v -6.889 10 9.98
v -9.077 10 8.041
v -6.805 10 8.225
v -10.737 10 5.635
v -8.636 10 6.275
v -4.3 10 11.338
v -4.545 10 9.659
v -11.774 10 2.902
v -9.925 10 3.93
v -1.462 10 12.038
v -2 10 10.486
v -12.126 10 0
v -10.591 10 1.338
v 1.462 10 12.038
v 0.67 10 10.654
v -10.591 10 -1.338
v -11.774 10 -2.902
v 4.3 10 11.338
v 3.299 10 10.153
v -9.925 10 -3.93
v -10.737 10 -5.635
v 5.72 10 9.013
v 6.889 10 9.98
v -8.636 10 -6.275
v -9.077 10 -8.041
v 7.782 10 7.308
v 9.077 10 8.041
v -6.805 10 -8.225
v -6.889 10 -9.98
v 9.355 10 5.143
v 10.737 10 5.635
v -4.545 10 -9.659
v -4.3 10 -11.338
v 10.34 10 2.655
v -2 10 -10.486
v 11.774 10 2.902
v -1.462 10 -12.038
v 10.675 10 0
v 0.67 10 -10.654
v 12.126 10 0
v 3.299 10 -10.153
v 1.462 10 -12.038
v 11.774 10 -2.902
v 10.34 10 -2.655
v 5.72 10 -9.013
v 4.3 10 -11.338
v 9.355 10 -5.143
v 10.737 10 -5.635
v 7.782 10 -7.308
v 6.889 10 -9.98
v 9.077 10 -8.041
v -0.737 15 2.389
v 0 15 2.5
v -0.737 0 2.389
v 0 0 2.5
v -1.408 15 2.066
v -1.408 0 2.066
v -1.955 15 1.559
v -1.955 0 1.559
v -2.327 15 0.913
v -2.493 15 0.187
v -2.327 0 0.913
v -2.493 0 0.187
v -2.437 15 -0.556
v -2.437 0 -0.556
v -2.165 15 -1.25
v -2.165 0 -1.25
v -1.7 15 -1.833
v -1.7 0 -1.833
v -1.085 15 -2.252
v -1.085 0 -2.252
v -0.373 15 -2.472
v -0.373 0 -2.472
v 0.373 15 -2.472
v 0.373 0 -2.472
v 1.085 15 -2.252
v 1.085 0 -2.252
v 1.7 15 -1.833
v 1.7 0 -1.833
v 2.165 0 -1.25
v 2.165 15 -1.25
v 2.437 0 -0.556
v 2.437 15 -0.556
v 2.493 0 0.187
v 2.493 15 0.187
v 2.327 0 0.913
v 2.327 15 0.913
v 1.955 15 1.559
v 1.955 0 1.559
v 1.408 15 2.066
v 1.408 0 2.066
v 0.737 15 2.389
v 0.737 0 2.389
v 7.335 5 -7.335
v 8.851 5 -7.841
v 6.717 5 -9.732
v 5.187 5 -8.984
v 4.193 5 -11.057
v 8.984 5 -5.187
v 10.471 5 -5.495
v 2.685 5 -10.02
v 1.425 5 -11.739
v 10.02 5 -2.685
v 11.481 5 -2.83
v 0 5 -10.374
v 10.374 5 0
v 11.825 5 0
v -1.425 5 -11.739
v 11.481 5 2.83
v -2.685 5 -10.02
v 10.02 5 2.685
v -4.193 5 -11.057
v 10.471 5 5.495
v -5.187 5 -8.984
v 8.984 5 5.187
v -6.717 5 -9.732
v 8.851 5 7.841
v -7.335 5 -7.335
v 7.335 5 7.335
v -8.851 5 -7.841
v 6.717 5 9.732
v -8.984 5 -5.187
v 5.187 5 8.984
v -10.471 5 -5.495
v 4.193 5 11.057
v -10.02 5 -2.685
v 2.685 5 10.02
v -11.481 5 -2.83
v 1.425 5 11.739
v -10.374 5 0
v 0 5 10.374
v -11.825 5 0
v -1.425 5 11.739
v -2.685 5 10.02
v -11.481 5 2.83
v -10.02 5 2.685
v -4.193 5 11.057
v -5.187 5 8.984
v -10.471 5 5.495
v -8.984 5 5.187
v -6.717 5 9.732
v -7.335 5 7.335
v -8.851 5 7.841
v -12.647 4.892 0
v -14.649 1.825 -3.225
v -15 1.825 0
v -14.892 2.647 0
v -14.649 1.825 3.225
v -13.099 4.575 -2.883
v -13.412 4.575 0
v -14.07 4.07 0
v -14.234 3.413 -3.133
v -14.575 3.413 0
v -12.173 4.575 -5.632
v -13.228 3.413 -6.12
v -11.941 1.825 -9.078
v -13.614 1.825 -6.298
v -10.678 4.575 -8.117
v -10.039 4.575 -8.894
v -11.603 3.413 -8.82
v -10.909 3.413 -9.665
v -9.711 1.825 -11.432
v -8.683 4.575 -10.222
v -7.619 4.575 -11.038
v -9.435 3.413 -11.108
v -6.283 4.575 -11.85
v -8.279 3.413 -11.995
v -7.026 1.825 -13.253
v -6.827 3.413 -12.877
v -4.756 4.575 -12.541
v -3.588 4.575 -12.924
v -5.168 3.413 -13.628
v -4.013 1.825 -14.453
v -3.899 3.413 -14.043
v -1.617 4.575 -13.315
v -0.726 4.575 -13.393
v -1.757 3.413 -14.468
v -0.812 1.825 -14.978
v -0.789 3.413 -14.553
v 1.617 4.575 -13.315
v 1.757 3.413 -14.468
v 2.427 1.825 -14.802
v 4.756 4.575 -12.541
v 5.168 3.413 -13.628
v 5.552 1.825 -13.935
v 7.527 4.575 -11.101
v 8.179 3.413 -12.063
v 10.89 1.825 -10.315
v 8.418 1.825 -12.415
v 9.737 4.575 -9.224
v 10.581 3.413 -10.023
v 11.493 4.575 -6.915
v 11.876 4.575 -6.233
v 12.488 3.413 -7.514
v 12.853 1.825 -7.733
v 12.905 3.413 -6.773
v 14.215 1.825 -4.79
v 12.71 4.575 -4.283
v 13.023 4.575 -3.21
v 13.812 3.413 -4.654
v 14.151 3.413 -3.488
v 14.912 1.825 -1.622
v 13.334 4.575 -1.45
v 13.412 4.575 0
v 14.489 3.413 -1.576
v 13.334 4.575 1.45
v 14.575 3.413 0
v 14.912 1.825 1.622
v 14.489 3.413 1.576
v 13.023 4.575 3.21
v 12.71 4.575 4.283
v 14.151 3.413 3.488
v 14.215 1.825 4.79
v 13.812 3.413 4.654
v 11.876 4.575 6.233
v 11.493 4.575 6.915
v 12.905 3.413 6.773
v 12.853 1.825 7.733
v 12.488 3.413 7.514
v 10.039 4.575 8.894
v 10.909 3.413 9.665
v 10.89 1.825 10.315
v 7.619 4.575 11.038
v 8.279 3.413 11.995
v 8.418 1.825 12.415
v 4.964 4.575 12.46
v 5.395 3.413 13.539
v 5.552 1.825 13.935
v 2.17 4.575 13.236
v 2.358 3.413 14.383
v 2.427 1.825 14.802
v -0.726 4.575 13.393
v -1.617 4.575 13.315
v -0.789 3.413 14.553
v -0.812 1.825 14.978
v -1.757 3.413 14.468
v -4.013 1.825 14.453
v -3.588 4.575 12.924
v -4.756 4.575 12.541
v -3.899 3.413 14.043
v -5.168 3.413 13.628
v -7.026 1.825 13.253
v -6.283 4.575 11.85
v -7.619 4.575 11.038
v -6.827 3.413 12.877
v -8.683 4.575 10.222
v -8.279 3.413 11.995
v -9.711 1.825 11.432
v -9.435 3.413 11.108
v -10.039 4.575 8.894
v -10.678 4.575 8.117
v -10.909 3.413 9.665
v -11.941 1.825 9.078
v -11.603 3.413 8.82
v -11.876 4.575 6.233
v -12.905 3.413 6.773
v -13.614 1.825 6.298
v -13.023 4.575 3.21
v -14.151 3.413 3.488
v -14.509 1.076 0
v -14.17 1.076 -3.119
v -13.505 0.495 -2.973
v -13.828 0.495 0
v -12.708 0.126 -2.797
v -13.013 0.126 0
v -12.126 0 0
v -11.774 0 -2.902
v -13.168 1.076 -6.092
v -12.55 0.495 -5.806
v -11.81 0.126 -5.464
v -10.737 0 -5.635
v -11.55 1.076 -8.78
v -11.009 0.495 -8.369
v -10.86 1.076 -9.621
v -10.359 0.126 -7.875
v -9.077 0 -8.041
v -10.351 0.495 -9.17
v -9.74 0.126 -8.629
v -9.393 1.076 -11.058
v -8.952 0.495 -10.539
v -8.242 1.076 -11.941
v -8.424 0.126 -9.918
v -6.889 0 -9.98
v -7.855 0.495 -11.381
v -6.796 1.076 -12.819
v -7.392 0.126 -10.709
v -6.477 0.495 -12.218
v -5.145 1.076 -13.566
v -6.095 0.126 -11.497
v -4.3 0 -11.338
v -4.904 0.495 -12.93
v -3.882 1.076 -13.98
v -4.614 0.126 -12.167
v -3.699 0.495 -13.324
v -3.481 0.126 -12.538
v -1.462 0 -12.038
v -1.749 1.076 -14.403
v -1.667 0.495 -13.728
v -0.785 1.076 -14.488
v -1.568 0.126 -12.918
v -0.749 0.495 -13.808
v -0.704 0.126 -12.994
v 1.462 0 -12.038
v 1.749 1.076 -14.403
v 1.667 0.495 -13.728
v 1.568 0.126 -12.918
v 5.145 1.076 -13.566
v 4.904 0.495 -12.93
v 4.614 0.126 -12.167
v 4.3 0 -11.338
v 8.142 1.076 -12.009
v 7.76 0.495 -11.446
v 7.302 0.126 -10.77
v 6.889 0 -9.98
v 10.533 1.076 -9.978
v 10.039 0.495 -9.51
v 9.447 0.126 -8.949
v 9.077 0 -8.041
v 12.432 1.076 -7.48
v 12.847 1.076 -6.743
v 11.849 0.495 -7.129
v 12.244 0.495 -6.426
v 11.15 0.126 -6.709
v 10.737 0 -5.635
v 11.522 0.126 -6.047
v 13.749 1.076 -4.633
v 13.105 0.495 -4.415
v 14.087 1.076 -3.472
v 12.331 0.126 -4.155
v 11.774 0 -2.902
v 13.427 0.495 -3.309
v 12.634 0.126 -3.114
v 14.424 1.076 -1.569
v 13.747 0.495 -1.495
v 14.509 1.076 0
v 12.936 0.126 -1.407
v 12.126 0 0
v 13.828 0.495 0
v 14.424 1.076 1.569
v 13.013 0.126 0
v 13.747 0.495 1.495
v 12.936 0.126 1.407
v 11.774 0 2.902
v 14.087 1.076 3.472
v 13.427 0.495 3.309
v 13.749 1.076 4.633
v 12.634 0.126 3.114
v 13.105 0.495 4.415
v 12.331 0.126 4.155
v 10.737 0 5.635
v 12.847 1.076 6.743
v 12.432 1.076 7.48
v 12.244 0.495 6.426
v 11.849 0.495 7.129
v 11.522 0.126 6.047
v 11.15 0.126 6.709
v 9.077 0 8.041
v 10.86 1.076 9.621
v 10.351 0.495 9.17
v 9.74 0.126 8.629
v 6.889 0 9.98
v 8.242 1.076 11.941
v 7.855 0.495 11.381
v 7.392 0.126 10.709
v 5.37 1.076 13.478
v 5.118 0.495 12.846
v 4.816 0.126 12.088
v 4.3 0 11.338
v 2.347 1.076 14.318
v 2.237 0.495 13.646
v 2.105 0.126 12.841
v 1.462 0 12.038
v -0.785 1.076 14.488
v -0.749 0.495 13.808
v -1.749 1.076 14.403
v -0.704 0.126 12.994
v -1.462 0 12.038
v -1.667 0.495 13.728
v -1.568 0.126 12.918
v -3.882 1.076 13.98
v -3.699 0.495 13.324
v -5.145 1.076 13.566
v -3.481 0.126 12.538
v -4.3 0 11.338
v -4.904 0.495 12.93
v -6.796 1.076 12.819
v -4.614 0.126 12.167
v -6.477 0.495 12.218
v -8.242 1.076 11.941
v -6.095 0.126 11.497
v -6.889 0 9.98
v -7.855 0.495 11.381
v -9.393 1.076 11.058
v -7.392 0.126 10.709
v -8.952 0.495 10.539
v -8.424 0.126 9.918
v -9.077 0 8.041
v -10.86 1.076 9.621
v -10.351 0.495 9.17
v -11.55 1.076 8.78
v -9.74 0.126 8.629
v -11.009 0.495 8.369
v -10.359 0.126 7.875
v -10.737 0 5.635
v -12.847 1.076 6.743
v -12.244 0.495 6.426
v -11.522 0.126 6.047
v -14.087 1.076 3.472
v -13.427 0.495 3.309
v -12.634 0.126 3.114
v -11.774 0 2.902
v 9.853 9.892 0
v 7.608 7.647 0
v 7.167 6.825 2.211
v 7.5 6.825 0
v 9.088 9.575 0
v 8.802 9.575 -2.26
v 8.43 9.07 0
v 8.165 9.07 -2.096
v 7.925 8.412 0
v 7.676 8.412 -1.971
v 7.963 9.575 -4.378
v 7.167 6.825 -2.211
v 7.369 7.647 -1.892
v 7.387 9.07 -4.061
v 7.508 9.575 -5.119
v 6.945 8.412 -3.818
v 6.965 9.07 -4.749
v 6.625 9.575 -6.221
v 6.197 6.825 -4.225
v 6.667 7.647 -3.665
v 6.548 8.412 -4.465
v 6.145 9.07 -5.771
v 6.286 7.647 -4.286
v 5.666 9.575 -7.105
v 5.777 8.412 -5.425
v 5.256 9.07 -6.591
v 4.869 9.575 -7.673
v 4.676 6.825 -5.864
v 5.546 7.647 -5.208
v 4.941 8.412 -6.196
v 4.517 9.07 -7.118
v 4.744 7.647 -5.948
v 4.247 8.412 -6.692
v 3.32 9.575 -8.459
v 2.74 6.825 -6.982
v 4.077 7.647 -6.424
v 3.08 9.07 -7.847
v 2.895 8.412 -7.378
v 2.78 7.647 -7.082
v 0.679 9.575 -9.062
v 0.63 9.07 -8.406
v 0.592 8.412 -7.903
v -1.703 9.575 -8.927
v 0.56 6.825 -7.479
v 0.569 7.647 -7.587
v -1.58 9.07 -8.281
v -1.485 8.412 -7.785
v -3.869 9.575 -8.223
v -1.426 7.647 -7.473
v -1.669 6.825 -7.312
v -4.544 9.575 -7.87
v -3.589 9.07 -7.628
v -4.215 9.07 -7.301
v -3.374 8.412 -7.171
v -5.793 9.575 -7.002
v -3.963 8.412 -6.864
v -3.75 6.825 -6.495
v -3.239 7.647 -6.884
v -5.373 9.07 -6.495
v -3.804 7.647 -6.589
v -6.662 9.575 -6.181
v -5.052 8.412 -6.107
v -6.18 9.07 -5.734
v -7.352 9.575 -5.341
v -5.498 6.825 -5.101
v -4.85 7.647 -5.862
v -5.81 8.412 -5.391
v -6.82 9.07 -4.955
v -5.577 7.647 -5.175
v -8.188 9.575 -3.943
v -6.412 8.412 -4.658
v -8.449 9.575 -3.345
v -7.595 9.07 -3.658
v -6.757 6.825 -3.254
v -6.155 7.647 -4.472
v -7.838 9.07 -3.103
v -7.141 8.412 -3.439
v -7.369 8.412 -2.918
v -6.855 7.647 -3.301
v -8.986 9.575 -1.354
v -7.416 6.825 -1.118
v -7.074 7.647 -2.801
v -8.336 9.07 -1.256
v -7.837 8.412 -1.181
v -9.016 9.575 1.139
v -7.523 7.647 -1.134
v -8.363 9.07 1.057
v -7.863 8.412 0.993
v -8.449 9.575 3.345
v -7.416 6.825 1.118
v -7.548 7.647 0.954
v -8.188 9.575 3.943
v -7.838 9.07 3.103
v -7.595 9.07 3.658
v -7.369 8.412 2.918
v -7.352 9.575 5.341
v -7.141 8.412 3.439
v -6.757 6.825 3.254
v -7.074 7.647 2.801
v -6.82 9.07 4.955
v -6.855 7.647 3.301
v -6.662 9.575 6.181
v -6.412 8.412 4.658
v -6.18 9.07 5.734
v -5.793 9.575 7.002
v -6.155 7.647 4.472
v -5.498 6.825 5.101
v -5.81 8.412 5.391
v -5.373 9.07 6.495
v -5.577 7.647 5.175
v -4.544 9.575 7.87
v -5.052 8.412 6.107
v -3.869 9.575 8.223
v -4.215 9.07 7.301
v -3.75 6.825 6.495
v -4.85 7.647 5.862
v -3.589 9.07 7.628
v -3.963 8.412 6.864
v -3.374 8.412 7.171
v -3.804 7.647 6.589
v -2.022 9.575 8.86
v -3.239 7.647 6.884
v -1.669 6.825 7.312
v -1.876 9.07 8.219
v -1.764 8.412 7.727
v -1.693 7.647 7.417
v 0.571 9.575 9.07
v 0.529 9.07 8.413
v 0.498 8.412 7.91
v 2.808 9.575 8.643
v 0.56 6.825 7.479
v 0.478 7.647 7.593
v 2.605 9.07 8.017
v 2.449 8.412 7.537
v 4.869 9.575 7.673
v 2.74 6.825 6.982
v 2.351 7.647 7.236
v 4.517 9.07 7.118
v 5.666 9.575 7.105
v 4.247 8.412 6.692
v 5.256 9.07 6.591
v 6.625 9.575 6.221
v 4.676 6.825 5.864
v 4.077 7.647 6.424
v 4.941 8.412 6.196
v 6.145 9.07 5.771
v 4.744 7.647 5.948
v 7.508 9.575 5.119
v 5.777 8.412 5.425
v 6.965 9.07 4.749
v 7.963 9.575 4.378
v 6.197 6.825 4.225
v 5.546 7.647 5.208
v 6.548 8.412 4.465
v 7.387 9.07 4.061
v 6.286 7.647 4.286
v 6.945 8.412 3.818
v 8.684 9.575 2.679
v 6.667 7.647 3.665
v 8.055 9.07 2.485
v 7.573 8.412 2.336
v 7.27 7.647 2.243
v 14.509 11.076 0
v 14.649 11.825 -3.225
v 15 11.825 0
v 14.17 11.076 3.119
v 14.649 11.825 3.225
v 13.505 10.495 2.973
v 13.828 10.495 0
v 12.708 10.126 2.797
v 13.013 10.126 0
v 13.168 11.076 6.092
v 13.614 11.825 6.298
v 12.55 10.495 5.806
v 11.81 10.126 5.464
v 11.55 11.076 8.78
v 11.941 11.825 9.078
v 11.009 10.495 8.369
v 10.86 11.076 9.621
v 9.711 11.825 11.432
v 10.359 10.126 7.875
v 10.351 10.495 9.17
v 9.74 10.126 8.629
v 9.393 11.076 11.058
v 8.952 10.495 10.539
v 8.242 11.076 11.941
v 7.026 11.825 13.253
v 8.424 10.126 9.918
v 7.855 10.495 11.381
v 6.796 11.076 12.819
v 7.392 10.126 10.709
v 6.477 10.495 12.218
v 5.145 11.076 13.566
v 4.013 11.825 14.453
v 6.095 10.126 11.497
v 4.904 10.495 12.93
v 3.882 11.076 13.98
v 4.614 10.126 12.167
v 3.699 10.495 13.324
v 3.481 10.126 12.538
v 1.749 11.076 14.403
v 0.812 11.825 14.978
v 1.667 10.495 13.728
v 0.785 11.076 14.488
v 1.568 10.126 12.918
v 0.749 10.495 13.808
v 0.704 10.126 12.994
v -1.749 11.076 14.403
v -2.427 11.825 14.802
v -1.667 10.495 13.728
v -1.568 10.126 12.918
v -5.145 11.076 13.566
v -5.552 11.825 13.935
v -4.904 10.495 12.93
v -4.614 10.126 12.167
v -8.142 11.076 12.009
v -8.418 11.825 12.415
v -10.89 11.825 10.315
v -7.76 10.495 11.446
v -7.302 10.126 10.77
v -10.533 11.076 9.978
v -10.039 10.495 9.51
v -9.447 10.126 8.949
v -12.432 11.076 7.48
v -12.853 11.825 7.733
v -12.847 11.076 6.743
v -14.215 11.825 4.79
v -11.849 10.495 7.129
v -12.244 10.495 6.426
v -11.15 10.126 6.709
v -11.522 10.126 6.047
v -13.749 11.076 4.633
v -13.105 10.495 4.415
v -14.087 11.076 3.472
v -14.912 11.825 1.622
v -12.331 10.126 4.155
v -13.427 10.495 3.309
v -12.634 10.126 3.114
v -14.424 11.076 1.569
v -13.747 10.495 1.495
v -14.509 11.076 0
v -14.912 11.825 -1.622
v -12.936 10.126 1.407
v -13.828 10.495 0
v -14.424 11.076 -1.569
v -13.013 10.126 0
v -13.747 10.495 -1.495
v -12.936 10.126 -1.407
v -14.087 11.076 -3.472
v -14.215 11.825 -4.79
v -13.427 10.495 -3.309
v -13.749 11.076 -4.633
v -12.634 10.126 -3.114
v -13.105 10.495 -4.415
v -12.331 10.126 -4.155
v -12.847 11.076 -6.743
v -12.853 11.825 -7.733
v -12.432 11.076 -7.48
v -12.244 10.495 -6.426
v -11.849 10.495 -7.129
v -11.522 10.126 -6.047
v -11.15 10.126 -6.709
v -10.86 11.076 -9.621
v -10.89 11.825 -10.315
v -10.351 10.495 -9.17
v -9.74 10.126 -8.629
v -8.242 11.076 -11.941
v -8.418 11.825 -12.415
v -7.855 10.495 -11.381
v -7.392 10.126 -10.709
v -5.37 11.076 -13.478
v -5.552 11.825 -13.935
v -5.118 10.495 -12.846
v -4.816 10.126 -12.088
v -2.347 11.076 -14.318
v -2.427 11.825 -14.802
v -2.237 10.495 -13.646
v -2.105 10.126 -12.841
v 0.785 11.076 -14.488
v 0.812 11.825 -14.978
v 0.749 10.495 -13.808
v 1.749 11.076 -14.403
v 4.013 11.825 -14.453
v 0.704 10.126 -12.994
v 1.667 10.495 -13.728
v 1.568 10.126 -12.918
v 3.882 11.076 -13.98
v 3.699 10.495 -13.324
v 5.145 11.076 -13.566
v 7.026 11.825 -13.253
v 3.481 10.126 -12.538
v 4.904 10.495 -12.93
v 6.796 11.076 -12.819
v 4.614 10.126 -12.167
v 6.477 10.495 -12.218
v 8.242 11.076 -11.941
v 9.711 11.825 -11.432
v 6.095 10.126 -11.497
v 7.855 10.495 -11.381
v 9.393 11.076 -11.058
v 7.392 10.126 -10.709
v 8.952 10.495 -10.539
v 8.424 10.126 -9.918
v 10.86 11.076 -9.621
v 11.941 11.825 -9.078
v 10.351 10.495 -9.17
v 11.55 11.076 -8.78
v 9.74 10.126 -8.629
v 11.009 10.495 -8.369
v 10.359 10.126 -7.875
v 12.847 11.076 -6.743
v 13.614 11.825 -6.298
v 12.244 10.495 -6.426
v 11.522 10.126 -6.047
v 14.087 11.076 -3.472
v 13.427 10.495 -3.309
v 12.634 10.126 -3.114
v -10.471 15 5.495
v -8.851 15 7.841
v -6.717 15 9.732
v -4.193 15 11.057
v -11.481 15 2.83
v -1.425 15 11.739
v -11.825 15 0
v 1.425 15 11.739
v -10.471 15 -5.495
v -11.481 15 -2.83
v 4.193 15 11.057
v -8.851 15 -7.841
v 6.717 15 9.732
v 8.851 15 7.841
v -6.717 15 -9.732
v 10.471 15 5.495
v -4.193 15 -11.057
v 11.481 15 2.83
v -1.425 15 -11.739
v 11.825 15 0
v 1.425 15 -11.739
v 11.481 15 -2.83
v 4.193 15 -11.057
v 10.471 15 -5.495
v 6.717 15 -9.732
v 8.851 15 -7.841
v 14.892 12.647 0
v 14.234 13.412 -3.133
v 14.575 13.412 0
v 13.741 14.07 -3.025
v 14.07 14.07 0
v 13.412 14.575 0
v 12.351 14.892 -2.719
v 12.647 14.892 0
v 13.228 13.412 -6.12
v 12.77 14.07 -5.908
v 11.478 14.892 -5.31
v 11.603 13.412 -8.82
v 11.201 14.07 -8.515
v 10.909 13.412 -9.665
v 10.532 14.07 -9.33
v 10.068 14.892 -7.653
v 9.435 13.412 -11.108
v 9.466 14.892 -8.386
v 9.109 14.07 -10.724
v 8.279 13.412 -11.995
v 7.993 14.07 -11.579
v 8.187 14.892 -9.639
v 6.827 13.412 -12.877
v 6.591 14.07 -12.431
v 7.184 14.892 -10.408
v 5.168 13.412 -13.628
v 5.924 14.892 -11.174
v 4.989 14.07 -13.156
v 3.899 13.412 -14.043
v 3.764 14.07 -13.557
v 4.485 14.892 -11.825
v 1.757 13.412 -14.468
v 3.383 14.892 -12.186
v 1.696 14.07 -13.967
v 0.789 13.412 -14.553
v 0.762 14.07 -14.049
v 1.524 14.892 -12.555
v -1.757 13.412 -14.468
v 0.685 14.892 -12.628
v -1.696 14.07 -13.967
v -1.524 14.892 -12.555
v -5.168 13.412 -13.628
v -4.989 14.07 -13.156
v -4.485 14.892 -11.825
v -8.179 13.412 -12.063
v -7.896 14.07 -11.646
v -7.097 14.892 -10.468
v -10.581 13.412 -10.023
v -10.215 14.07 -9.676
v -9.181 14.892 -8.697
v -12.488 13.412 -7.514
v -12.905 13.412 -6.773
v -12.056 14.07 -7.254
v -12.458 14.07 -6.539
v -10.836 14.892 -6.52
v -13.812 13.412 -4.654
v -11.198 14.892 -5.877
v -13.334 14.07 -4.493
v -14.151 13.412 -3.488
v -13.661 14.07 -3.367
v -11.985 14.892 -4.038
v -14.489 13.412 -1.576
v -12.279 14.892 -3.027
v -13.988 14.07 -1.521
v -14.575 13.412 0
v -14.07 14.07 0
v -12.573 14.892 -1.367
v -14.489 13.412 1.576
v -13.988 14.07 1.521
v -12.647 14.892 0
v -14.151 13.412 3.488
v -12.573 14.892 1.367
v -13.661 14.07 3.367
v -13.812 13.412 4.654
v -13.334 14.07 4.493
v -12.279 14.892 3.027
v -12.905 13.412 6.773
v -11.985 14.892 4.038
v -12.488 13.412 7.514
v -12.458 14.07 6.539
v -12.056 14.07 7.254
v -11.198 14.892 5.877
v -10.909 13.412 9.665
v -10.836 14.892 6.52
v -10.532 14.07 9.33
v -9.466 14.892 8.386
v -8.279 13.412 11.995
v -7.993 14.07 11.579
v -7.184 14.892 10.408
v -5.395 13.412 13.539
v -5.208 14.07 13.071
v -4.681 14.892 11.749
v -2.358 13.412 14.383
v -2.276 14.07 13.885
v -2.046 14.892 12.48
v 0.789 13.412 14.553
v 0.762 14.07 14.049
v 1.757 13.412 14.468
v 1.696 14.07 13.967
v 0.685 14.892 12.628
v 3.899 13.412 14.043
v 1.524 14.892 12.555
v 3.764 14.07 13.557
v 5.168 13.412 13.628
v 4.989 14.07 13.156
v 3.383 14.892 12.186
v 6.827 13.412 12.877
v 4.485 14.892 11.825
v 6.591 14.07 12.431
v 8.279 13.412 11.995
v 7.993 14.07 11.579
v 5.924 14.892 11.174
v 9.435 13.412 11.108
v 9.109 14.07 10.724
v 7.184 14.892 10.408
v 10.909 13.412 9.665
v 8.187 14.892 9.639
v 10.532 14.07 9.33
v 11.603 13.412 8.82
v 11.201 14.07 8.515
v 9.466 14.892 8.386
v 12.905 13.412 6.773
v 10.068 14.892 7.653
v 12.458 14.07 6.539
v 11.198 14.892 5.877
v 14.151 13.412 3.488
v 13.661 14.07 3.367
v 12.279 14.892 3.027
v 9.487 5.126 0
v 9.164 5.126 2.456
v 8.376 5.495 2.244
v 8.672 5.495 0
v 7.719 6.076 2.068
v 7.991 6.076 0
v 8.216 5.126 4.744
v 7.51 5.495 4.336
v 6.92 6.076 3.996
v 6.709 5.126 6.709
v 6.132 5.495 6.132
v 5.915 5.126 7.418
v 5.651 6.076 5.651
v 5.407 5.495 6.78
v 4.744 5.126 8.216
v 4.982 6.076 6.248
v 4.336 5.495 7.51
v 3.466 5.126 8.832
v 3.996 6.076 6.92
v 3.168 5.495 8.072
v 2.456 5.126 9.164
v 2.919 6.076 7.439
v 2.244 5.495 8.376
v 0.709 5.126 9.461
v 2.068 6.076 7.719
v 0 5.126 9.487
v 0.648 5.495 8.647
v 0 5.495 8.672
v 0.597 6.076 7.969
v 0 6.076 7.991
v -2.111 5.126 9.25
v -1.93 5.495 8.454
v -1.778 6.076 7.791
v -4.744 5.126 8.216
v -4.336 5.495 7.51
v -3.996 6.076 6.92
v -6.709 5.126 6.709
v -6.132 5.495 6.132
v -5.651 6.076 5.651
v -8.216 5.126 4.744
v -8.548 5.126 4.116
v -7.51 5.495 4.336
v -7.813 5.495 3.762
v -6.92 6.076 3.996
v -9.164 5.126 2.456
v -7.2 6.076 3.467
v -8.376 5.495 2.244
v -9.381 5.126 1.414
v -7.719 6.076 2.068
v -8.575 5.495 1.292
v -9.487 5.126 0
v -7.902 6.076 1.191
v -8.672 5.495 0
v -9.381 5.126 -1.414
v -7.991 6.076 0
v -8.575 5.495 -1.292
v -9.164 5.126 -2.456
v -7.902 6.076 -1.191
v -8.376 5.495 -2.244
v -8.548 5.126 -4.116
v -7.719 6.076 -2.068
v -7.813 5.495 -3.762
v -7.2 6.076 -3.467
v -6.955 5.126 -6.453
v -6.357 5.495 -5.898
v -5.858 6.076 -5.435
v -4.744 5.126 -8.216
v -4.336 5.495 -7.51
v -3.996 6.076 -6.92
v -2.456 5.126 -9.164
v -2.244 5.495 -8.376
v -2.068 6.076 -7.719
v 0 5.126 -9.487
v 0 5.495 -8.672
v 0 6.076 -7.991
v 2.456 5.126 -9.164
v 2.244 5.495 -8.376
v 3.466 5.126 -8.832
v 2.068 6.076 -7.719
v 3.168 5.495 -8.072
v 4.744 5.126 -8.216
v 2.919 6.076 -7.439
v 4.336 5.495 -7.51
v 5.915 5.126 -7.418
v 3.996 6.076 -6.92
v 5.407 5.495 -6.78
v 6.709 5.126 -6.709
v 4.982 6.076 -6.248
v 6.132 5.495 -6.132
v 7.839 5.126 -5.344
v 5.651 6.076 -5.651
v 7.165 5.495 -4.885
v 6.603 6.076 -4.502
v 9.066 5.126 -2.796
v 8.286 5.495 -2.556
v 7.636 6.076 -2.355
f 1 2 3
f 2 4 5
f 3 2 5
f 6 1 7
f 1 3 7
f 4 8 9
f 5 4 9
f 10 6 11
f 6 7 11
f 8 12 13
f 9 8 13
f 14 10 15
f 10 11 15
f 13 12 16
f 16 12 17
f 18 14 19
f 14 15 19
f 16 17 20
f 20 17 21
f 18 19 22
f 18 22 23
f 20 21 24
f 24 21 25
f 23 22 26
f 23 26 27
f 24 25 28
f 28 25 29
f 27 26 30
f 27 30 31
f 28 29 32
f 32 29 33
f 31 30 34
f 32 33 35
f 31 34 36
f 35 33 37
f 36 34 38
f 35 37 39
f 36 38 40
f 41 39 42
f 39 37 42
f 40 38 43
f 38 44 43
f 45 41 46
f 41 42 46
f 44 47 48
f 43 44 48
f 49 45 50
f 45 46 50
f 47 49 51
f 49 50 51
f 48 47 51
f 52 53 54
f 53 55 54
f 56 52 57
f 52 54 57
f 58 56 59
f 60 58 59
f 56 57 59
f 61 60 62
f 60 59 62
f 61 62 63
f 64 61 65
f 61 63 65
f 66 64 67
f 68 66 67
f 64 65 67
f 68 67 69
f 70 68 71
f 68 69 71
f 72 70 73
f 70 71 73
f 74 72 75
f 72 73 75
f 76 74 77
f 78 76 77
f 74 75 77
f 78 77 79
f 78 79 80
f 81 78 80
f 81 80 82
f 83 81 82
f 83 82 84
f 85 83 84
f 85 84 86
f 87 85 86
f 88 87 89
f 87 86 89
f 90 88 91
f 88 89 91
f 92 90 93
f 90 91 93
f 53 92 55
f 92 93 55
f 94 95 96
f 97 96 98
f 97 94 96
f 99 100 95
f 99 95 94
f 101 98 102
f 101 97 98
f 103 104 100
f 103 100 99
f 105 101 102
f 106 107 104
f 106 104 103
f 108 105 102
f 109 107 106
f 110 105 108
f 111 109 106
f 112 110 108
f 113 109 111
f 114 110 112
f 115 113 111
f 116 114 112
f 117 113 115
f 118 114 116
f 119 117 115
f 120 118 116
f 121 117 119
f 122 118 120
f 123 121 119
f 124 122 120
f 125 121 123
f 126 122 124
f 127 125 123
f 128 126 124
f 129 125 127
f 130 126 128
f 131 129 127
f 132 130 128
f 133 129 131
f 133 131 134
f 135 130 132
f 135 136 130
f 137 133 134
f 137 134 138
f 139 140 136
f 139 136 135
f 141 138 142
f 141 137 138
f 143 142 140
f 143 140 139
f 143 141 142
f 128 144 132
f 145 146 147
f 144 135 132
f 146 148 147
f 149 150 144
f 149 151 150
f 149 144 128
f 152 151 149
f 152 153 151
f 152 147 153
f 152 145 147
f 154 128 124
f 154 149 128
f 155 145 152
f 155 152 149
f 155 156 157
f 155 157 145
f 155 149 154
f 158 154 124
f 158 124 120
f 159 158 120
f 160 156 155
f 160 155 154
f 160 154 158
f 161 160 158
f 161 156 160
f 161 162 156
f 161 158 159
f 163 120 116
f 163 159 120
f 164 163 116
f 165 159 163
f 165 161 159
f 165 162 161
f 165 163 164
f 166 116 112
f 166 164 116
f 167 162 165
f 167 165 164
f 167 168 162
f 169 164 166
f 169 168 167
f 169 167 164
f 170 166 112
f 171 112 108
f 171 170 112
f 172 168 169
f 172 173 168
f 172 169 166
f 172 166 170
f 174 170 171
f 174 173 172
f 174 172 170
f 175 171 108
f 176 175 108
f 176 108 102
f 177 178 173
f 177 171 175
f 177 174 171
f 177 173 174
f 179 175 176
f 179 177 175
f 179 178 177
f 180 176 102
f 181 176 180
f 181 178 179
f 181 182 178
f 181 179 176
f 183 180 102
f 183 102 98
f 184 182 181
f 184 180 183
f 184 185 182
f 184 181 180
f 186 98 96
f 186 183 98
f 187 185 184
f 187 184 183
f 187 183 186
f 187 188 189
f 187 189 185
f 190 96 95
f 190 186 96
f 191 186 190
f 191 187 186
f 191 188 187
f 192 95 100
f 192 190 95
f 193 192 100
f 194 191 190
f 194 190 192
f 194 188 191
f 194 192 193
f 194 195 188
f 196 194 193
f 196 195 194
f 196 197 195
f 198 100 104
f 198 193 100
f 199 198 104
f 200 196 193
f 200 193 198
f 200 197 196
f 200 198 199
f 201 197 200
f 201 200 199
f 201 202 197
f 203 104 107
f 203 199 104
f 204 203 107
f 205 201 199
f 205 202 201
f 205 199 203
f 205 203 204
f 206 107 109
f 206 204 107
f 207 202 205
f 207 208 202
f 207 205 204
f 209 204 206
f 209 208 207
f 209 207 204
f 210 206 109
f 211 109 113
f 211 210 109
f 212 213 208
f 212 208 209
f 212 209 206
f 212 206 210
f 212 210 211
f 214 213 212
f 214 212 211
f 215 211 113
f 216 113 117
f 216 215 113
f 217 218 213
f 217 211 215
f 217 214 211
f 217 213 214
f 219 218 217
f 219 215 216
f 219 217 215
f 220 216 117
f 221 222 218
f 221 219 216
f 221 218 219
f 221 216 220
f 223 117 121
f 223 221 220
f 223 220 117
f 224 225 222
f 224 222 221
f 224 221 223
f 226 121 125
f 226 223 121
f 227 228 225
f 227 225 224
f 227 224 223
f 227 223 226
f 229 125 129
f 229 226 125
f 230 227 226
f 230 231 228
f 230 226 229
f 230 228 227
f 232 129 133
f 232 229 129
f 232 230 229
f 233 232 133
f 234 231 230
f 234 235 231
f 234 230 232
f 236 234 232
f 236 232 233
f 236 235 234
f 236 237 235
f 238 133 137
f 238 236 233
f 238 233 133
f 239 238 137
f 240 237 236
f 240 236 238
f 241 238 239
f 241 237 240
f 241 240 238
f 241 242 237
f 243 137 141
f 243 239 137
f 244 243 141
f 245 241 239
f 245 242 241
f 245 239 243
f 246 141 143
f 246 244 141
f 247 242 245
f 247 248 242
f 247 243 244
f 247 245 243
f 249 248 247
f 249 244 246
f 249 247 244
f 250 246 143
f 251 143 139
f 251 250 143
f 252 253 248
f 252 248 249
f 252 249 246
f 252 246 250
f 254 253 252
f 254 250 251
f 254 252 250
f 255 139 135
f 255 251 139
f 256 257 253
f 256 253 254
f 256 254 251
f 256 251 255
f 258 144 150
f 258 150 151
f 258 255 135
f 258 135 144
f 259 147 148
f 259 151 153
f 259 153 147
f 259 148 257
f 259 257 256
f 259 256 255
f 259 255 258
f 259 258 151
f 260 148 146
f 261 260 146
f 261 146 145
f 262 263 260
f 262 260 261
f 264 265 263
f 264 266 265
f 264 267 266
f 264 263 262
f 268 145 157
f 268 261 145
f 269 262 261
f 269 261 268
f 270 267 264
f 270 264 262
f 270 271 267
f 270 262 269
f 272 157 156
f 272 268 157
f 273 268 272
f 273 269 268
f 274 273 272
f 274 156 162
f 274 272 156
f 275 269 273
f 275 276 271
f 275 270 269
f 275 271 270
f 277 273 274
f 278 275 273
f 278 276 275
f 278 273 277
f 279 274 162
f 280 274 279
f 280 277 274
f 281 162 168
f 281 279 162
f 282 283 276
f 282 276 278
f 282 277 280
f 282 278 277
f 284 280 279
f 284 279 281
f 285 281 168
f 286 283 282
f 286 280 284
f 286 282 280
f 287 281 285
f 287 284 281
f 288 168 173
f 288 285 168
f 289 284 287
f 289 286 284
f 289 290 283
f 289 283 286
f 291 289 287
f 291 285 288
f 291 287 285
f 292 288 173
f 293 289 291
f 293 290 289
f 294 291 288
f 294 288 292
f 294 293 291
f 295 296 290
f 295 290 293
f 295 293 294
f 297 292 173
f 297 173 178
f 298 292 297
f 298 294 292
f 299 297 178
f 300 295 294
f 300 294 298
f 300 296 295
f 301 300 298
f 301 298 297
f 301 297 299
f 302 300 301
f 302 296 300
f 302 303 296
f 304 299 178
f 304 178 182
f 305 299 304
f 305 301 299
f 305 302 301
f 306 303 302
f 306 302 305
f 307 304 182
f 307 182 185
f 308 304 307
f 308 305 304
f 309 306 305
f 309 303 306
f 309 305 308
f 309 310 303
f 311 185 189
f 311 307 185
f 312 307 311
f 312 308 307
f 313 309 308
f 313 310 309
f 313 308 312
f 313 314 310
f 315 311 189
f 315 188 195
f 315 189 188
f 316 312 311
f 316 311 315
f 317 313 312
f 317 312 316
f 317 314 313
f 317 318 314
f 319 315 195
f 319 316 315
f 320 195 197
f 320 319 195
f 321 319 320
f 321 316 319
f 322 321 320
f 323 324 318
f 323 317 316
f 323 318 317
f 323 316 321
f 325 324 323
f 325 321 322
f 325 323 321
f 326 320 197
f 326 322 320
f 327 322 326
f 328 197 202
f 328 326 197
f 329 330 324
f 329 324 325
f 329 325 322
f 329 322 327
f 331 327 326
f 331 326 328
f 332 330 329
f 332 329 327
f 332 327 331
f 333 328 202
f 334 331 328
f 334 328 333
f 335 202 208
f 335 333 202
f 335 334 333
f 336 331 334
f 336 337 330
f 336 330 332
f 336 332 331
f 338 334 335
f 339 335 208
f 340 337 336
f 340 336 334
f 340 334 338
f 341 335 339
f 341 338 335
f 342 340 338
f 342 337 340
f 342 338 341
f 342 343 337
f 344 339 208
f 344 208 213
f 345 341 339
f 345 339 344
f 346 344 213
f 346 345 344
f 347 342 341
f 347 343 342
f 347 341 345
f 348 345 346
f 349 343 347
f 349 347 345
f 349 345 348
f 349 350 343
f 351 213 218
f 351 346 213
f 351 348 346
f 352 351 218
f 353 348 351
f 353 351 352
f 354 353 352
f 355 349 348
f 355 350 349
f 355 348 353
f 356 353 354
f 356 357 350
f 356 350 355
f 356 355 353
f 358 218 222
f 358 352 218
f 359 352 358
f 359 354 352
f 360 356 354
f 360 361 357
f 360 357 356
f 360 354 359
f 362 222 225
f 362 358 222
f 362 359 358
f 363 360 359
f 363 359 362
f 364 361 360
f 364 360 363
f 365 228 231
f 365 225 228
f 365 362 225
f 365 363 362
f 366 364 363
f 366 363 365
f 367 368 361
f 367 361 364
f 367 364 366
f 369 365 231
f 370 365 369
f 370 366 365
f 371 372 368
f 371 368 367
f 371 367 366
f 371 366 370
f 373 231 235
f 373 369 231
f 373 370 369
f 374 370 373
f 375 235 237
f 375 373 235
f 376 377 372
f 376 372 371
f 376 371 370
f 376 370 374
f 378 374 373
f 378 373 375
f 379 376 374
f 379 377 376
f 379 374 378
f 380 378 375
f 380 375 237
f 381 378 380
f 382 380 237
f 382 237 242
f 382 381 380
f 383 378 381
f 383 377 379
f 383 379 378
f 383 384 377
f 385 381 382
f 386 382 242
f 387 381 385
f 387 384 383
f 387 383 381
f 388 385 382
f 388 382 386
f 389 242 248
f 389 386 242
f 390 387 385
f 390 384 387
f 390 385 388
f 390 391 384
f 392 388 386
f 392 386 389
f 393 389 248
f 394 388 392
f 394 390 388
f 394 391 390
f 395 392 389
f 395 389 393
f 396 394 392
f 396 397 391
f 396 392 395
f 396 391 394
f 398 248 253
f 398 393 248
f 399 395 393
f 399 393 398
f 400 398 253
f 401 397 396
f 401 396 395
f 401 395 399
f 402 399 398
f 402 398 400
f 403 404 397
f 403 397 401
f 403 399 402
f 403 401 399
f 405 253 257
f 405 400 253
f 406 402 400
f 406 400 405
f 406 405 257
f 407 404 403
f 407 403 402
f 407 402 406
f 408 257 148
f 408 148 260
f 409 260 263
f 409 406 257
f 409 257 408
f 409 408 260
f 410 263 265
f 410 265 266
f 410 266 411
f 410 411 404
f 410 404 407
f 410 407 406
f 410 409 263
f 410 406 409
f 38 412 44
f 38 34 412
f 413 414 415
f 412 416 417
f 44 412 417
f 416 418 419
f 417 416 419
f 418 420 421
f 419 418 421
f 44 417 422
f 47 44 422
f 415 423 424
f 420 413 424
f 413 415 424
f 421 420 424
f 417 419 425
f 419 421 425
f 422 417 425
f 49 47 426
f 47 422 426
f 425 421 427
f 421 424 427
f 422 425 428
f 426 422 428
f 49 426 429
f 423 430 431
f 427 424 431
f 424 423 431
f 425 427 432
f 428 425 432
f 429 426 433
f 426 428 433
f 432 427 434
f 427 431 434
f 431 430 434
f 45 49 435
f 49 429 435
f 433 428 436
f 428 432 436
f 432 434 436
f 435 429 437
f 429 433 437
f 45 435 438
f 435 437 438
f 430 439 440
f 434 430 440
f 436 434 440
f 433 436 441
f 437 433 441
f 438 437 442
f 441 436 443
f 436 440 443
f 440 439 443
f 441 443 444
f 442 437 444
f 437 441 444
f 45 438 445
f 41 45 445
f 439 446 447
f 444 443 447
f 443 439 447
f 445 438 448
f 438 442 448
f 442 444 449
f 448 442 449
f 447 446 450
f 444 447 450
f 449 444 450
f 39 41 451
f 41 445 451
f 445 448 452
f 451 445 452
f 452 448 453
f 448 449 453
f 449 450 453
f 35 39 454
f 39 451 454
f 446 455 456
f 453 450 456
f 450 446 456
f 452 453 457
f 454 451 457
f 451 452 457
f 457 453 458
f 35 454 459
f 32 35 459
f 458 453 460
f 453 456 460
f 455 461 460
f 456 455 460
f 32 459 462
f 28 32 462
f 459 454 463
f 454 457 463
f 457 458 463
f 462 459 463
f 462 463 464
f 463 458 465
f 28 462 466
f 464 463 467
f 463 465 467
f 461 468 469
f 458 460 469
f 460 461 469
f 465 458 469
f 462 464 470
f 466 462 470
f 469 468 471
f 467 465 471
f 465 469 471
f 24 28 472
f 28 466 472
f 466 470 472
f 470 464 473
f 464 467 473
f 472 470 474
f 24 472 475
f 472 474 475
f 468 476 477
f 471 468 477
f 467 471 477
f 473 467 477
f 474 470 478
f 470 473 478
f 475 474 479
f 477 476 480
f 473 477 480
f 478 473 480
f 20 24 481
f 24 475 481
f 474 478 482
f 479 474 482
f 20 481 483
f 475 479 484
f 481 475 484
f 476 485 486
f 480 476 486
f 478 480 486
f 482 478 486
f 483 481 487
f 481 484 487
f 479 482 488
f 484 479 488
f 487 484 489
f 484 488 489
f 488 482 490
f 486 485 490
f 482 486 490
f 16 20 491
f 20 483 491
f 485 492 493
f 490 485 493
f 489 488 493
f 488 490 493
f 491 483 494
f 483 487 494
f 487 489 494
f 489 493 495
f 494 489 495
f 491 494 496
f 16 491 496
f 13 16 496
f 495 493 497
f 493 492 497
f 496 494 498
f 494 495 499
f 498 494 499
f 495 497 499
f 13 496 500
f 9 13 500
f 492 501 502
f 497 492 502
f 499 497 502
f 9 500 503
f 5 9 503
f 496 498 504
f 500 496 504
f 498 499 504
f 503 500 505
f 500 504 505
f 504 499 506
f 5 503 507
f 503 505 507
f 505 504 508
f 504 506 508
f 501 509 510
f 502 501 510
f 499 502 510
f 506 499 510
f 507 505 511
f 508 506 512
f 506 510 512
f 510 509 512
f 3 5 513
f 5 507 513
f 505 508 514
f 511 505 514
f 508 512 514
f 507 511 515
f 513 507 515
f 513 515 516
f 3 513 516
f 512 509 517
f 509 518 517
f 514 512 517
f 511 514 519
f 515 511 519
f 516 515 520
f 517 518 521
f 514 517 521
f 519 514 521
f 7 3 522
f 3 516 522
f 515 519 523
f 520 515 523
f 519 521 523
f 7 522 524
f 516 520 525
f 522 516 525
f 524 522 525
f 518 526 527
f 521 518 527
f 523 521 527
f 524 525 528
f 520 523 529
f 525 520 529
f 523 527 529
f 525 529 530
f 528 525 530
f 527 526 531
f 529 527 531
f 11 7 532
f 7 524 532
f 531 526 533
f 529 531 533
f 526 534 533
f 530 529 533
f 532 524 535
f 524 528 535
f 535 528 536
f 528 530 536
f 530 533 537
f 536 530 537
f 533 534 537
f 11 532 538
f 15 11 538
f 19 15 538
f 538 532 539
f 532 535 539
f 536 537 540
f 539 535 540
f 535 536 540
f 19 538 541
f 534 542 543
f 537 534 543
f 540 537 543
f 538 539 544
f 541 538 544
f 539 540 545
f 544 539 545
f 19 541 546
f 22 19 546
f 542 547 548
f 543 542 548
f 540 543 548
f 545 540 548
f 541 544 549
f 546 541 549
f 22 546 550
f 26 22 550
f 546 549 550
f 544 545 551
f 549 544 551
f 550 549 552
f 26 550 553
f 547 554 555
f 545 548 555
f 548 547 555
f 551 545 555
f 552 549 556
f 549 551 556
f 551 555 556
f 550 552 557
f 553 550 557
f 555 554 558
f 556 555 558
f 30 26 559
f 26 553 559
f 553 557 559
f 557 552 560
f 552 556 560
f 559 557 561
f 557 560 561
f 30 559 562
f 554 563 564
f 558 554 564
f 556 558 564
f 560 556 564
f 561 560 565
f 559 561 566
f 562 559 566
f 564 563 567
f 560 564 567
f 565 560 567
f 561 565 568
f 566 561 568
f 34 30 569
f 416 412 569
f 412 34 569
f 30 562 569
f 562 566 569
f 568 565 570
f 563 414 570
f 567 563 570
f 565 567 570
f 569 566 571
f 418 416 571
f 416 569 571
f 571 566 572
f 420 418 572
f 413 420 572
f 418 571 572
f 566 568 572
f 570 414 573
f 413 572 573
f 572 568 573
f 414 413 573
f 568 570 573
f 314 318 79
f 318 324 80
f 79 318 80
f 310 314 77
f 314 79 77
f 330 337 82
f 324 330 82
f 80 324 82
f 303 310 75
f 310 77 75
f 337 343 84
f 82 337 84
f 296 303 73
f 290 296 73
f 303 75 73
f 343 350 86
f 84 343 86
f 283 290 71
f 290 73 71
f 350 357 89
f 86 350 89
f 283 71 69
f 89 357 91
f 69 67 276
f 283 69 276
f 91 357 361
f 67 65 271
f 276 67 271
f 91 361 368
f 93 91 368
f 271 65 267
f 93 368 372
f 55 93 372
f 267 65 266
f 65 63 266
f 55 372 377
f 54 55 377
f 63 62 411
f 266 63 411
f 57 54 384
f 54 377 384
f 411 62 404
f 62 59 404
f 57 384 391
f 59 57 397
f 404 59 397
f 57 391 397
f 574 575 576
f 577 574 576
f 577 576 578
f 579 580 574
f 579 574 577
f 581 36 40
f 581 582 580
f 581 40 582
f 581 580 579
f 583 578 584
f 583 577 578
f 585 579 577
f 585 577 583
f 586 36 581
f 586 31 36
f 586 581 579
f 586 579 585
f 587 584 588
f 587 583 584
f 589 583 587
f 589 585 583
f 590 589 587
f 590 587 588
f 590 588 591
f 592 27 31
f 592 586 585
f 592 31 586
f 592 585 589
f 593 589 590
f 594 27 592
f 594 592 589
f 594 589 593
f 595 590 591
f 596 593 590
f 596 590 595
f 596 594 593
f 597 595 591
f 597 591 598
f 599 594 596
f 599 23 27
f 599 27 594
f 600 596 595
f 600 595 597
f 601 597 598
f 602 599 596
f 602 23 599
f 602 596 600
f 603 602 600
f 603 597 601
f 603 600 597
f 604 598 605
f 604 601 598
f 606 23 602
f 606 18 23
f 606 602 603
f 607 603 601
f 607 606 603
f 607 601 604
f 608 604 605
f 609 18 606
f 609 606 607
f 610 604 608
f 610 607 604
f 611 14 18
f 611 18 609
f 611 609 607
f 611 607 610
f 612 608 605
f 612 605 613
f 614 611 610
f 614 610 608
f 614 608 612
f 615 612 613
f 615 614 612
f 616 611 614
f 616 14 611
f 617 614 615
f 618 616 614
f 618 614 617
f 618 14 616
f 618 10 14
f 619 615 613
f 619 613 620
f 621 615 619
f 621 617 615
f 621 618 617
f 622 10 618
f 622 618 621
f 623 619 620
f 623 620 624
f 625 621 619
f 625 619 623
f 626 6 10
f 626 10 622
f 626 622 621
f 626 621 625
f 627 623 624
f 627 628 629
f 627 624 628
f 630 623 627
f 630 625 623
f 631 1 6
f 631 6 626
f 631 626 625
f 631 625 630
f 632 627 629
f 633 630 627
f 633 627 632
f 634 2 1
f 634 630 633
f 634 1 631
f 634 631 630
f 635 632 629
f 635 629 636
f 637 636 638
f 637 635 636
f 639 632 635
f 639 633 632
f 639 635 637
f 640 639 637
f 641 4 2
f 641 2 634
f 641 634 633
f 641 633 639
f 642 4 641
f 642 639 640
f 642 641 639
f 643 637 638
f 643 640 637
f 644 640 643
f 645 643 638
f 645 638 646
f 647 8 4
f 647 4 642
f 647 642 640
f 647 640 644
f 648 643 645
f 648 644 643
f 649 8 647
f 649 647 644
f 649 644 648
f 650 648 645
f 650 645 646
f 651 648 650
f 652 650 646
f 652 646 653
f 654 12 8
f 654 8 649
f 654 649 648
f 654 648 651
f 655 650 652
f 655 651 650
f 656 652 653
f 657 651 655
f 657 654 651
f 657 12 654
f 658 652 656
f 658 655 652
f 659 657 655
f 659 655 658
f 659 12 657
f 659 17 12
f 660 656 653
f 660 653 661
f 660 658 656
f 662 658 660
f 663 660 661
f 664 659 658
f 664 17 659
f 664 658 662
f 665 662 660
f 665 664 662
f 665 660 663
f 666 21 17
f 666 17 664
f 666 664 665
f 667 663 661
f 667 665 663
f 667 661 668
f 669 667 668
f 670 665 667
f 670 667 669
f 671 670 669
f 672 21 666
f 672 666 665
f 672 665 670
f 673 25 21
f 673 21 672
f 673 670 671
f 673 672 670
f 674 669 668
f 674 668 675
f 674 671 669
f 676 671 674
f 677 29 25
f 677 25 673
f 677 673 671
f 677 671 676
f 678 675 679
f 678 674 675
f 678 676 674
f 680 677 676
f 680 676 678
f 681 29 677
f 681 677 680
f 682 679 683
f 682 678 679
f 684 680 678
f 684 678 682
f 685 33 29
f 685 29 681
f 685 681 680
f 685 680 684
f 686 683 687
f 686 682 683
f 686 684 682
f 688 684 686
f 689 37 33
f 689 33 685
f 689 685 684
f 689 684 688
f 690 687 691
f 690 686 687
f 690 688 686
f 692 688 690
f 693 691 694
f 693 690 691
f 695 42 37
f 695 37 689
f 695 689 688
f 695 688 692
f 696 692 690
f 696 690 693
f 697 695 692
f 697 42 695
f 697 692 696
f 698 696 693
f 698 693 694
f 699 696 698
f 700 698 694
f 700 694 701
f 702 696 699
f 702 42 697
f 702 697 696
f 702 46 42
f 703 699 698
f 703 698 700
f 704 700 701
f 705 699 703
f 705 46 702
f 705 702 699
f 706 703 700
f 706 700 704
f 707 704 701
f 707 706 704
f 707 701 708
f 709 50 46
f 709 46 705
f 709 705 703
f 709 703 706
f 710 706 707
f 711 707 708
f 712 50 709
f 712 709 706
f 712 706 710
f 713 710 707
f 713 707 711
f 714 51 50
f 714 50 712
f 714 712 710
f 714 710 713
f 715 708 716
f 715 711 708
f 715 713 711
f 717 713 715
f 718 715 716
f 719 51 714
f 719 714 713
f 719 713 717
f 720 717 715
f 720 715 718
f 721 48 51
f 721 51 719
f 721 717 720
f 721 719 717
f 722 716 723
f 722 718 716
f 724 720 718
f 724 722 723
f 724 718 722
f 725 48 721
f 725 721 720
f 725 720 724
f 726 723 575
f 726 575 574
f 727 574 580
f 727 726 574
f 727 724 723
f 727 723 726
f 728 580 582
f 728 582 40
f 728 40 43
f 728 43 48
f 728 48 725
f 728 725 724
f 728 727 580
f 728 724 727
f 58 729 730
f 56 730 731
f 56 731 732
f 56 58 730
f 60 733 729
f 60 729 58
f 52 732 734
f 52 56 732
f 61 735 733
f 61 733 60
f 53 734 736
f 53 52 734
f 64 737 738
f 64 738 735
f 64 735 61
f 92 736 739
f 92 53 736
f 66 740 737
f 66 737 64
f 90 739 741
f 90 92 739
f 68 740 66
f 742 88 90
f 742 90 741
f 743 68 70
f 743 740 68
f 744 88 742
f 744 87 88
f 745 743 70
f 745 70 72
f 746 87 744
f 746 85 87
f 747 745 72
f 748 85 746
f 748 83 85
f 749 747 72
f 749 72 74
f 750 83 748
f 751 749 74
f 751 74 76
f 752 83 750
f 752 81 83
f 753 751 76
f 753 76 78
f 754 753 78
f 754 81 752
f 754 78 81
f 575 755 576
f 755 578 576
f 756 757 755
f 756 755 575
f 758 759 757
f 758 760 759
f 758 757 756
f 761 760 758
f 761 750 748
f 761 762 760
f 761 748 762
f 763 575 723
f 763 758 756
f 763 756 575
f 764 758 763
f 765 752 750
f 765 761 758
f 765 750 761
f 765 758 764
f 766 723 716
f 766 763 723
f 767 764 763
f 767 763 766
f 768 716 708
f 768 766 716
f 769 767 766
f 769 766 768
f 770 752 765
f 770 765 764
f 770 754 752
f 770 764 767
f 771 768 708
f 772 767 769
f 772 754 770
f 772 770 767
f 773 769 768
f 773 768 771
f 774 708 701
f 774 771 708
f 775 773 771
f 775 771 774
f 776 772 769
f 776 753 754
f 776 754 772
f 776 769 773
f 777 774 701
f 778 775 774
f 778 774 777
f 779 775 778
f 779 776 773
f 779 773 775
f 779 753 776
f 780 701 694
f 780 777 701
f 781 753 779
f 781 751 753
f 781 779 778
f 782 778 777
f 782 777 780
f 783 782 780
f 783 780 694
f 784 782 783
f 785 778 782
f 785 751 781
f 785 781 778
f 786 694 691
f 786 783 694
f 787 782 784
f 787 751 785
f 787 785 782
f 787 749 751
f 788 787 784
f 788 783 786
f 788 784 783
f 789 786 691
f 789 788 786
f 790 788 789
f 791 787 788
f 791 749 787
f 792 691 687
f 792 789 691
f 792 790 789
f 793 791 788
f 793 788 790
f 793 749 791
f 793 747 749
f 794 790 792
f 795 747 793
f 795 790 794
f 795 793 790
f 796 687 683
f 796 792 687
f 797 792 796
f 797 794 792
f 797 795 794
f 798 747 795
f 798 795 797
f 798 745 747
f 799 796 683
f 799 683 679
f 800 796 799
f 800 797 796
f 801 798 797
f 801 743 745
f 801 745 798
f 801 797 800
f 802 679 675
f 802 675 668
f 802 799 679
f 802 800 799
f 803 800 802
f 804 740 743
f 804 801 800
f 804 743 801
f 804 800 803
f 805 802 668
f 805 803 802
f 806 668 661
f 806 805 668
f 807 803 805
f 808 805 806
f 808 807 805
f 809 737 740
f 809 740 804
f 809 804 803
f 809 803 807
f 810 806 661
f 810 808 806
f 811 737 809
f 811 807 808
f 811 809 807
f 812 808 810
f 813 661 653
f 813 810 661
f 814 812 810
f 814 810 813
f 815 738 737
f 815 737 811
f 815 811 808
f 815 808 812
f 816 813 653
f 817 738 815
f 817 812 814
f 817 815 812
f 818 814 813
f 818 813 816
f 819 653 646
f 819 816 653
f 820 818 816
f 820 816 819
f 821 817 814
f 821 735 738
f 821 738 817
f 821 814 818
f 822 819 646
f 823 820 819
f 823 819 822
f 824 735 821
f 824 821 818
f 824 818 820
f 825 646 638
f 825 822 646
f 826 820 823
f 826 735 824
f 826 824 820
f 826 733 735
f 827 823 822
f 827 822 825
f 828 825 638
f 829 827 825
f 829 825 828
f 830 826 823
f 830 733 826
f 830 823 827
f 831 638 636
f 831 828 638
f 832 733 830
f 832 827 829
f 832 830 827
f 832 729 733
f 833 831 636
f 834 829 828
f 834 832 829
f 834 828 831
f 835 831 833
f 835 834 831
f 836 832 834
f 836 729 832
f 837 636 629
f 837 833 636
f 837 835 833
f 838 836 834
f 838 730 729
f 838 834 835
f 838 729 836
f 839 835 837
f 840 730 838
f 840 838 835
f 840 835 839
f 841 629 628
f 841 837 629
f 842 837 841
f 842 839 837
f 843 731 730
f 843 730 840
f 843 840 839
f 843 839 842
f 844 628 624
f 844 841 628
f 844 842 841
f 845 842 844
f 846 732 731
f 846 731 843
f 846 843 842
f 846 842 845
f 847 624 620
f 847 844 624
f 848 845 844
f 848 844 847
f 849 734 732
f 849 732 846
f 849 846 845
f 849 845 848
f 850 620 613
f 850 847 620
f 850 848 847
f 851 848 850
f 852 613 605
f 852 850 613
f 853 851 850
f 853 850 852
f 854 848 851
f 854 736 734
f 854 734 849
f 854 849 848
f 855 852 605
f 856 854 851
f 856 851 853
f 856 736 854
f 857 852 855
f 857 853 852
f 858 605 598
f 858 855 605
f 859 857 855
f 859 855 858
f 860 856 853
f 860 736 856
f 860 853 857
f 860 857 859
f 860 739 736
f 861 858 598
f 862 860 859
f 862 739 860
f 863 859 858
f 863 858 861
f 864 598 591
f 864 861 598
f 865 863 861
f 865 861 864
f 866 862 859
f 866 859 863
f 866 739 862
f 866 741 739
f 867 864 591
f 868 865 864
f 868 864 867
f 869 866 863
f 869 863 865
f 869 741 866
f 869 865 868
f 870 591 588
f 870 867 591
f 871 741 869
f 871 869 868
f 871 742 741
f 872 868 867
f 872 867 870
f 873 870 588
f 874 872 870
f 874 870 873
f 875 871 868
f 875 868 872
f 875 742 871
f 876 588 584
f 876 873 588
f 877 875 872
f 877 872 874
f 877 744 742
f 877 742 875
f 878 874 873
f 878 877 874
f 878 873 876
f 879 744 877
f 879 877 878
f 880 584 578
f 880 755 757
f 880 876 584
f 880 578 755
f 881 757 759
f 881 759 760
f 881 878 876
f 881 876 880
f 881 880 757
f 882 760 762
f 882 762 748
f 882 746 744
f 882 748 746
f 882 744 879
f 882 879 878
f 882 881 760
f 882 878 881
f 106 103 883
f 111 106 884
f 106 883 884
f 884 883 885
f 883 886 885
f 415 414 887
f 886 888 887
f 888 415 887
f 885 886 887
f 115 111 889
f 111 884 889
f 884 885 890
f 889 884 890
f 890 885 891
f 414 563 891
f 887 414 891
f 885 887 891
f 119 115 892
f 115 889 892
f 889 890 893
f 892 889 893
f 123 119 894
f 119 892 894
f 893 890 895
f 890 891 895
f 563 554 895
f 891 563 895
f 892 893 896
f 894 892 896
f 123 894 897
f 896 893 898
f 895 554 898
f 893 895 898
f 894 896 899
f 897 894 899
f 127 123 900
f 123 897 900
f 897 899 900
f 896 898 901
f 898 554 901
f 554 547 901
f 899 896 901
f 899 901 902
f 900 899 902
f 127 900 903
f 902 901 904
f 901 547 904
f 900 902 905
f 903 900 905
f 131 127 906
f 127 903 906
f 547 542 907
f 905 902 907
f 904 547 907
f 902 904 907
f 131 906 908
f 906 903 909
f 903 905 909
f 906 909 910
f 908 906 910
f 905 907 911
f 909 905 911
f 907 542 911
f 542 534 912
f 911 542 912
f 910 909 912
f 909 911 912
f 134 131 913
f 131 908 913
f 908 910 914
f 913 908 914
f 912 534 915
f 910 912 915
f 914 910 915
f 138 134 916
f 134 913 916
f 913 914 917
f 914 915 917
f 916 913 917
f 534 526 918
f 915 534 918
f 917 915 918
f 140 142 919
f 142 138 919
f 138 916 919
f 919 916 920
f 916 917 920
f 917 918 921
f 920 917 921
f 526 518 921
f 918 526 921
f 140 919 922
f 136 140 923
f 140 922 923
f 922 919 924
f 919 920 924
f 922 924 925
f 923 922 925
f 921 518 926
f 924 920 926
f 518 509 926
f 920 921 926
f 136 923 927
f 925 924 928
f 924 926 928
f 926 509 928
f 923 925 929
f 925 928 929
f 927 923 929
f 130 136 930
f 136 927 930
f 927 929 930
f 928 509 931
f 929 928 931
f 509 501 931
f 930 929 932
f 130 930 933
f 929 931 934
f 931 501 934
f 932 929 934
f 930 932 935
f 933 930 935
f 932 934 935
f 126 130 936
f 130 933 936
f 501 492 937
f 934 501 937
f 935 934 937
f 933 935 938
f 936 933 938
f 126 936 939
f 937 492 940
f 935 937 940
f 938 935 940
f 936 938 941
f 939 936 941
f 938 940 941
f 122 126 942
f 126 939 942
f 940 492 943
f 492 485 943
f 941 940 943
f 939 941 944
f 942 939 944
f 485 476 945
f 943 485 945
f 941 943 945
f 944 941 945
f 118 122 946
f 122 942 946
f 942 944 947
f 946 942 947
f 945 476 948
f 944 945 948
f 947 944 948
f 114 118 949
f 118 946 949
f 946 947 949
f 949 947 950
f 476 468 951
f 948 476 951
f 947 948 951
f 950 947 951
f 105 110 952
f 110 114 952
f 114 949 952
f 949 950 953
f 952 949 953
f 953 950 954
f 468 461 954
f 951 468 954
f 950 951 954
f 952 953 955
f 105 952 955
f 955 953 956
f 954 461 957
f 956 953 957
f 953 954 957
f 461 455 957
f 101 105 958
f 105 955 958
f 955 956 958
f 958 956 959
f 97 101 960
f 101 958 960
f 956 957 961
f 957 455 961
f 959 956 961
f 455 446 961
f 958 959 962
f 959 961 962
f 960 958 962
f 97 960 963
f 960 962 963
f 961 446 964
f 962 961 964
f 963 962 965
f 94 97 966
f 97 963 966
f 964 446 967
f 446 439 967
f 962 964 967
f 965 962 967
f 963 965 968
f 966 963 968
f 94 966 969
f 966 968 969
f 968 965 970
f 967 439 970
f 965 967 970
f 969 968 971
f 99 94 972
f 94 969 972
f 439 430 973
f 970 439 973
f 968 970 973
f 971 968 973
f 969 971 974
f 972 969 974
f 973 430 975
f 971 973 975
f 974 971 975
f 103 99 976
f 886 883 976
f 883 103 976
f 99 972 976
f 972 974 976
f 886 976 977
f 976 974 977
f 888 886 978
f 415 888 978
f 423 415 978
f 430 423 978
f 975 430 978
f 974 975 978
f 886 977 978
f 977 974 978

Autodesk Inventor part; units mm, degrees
ref_plane "YZ Plane" through (0, 0, 0) normal (1, 0, 0) x (0, 1, 0)
ref_plane "XZ Plane" through (0, 0, 0) normal (0, 1, 0) x (-1, 0, 0)
ref_plane "XY Plane" through (0, 0, 0) normal (0, 0, 1) x (1, 0, 0)
sketch "Sketch1" plane through (0, 0, 0) normal (0, 1, 0) x (-1, 0, 0)
  circle A0 centre (0, 0) radius 15
  dimension "d0" = 30
extrude "Extrusion1" add sketch "Sketch1" along normal blind 5
sketch "Sketch2" plane through (0, 5, 0) normal (0, 1, 0) x (1, 0, 0)
  circle A0 centre (0, 0) radius 7.5
  dimension "d3" = 15
extrude "Extrusion2" add sketch "Sketch2" along normal blind 5
sketch "Sketch3" plane through (0, 10, 0) normal (0, 1, 0) x (1, 0, 0)
  circle A0 centre (0, 0) radius 15
  dimension "d6" = 30
extrude "Extrusion3" add sketch "Sketch3" along normal blind 5
fillet "Fillet1" radius 3.175 1 edges at (-15, 15, 0)
fillet "Fillet2" radius 3.175 1 edges at (-15, 10, 0)
fillet "Fillet3" radius 3.175 1 edges at (-7.5, 10, 0)
fillet "Fillet4" radius 3.175 1 edges at (15, 5, 0)
fillet "Fillet5" radius 3.175 1 edges at (15, 0, 0)
fillet "Fillet6" radius 3.175 1 edges at (-7.5, 5, 0)
hole "Hole1" at (0, 15, 0) direction (0, -1, 0) diameter 5 end through all
properties part number "even more awesome inventor thing"
